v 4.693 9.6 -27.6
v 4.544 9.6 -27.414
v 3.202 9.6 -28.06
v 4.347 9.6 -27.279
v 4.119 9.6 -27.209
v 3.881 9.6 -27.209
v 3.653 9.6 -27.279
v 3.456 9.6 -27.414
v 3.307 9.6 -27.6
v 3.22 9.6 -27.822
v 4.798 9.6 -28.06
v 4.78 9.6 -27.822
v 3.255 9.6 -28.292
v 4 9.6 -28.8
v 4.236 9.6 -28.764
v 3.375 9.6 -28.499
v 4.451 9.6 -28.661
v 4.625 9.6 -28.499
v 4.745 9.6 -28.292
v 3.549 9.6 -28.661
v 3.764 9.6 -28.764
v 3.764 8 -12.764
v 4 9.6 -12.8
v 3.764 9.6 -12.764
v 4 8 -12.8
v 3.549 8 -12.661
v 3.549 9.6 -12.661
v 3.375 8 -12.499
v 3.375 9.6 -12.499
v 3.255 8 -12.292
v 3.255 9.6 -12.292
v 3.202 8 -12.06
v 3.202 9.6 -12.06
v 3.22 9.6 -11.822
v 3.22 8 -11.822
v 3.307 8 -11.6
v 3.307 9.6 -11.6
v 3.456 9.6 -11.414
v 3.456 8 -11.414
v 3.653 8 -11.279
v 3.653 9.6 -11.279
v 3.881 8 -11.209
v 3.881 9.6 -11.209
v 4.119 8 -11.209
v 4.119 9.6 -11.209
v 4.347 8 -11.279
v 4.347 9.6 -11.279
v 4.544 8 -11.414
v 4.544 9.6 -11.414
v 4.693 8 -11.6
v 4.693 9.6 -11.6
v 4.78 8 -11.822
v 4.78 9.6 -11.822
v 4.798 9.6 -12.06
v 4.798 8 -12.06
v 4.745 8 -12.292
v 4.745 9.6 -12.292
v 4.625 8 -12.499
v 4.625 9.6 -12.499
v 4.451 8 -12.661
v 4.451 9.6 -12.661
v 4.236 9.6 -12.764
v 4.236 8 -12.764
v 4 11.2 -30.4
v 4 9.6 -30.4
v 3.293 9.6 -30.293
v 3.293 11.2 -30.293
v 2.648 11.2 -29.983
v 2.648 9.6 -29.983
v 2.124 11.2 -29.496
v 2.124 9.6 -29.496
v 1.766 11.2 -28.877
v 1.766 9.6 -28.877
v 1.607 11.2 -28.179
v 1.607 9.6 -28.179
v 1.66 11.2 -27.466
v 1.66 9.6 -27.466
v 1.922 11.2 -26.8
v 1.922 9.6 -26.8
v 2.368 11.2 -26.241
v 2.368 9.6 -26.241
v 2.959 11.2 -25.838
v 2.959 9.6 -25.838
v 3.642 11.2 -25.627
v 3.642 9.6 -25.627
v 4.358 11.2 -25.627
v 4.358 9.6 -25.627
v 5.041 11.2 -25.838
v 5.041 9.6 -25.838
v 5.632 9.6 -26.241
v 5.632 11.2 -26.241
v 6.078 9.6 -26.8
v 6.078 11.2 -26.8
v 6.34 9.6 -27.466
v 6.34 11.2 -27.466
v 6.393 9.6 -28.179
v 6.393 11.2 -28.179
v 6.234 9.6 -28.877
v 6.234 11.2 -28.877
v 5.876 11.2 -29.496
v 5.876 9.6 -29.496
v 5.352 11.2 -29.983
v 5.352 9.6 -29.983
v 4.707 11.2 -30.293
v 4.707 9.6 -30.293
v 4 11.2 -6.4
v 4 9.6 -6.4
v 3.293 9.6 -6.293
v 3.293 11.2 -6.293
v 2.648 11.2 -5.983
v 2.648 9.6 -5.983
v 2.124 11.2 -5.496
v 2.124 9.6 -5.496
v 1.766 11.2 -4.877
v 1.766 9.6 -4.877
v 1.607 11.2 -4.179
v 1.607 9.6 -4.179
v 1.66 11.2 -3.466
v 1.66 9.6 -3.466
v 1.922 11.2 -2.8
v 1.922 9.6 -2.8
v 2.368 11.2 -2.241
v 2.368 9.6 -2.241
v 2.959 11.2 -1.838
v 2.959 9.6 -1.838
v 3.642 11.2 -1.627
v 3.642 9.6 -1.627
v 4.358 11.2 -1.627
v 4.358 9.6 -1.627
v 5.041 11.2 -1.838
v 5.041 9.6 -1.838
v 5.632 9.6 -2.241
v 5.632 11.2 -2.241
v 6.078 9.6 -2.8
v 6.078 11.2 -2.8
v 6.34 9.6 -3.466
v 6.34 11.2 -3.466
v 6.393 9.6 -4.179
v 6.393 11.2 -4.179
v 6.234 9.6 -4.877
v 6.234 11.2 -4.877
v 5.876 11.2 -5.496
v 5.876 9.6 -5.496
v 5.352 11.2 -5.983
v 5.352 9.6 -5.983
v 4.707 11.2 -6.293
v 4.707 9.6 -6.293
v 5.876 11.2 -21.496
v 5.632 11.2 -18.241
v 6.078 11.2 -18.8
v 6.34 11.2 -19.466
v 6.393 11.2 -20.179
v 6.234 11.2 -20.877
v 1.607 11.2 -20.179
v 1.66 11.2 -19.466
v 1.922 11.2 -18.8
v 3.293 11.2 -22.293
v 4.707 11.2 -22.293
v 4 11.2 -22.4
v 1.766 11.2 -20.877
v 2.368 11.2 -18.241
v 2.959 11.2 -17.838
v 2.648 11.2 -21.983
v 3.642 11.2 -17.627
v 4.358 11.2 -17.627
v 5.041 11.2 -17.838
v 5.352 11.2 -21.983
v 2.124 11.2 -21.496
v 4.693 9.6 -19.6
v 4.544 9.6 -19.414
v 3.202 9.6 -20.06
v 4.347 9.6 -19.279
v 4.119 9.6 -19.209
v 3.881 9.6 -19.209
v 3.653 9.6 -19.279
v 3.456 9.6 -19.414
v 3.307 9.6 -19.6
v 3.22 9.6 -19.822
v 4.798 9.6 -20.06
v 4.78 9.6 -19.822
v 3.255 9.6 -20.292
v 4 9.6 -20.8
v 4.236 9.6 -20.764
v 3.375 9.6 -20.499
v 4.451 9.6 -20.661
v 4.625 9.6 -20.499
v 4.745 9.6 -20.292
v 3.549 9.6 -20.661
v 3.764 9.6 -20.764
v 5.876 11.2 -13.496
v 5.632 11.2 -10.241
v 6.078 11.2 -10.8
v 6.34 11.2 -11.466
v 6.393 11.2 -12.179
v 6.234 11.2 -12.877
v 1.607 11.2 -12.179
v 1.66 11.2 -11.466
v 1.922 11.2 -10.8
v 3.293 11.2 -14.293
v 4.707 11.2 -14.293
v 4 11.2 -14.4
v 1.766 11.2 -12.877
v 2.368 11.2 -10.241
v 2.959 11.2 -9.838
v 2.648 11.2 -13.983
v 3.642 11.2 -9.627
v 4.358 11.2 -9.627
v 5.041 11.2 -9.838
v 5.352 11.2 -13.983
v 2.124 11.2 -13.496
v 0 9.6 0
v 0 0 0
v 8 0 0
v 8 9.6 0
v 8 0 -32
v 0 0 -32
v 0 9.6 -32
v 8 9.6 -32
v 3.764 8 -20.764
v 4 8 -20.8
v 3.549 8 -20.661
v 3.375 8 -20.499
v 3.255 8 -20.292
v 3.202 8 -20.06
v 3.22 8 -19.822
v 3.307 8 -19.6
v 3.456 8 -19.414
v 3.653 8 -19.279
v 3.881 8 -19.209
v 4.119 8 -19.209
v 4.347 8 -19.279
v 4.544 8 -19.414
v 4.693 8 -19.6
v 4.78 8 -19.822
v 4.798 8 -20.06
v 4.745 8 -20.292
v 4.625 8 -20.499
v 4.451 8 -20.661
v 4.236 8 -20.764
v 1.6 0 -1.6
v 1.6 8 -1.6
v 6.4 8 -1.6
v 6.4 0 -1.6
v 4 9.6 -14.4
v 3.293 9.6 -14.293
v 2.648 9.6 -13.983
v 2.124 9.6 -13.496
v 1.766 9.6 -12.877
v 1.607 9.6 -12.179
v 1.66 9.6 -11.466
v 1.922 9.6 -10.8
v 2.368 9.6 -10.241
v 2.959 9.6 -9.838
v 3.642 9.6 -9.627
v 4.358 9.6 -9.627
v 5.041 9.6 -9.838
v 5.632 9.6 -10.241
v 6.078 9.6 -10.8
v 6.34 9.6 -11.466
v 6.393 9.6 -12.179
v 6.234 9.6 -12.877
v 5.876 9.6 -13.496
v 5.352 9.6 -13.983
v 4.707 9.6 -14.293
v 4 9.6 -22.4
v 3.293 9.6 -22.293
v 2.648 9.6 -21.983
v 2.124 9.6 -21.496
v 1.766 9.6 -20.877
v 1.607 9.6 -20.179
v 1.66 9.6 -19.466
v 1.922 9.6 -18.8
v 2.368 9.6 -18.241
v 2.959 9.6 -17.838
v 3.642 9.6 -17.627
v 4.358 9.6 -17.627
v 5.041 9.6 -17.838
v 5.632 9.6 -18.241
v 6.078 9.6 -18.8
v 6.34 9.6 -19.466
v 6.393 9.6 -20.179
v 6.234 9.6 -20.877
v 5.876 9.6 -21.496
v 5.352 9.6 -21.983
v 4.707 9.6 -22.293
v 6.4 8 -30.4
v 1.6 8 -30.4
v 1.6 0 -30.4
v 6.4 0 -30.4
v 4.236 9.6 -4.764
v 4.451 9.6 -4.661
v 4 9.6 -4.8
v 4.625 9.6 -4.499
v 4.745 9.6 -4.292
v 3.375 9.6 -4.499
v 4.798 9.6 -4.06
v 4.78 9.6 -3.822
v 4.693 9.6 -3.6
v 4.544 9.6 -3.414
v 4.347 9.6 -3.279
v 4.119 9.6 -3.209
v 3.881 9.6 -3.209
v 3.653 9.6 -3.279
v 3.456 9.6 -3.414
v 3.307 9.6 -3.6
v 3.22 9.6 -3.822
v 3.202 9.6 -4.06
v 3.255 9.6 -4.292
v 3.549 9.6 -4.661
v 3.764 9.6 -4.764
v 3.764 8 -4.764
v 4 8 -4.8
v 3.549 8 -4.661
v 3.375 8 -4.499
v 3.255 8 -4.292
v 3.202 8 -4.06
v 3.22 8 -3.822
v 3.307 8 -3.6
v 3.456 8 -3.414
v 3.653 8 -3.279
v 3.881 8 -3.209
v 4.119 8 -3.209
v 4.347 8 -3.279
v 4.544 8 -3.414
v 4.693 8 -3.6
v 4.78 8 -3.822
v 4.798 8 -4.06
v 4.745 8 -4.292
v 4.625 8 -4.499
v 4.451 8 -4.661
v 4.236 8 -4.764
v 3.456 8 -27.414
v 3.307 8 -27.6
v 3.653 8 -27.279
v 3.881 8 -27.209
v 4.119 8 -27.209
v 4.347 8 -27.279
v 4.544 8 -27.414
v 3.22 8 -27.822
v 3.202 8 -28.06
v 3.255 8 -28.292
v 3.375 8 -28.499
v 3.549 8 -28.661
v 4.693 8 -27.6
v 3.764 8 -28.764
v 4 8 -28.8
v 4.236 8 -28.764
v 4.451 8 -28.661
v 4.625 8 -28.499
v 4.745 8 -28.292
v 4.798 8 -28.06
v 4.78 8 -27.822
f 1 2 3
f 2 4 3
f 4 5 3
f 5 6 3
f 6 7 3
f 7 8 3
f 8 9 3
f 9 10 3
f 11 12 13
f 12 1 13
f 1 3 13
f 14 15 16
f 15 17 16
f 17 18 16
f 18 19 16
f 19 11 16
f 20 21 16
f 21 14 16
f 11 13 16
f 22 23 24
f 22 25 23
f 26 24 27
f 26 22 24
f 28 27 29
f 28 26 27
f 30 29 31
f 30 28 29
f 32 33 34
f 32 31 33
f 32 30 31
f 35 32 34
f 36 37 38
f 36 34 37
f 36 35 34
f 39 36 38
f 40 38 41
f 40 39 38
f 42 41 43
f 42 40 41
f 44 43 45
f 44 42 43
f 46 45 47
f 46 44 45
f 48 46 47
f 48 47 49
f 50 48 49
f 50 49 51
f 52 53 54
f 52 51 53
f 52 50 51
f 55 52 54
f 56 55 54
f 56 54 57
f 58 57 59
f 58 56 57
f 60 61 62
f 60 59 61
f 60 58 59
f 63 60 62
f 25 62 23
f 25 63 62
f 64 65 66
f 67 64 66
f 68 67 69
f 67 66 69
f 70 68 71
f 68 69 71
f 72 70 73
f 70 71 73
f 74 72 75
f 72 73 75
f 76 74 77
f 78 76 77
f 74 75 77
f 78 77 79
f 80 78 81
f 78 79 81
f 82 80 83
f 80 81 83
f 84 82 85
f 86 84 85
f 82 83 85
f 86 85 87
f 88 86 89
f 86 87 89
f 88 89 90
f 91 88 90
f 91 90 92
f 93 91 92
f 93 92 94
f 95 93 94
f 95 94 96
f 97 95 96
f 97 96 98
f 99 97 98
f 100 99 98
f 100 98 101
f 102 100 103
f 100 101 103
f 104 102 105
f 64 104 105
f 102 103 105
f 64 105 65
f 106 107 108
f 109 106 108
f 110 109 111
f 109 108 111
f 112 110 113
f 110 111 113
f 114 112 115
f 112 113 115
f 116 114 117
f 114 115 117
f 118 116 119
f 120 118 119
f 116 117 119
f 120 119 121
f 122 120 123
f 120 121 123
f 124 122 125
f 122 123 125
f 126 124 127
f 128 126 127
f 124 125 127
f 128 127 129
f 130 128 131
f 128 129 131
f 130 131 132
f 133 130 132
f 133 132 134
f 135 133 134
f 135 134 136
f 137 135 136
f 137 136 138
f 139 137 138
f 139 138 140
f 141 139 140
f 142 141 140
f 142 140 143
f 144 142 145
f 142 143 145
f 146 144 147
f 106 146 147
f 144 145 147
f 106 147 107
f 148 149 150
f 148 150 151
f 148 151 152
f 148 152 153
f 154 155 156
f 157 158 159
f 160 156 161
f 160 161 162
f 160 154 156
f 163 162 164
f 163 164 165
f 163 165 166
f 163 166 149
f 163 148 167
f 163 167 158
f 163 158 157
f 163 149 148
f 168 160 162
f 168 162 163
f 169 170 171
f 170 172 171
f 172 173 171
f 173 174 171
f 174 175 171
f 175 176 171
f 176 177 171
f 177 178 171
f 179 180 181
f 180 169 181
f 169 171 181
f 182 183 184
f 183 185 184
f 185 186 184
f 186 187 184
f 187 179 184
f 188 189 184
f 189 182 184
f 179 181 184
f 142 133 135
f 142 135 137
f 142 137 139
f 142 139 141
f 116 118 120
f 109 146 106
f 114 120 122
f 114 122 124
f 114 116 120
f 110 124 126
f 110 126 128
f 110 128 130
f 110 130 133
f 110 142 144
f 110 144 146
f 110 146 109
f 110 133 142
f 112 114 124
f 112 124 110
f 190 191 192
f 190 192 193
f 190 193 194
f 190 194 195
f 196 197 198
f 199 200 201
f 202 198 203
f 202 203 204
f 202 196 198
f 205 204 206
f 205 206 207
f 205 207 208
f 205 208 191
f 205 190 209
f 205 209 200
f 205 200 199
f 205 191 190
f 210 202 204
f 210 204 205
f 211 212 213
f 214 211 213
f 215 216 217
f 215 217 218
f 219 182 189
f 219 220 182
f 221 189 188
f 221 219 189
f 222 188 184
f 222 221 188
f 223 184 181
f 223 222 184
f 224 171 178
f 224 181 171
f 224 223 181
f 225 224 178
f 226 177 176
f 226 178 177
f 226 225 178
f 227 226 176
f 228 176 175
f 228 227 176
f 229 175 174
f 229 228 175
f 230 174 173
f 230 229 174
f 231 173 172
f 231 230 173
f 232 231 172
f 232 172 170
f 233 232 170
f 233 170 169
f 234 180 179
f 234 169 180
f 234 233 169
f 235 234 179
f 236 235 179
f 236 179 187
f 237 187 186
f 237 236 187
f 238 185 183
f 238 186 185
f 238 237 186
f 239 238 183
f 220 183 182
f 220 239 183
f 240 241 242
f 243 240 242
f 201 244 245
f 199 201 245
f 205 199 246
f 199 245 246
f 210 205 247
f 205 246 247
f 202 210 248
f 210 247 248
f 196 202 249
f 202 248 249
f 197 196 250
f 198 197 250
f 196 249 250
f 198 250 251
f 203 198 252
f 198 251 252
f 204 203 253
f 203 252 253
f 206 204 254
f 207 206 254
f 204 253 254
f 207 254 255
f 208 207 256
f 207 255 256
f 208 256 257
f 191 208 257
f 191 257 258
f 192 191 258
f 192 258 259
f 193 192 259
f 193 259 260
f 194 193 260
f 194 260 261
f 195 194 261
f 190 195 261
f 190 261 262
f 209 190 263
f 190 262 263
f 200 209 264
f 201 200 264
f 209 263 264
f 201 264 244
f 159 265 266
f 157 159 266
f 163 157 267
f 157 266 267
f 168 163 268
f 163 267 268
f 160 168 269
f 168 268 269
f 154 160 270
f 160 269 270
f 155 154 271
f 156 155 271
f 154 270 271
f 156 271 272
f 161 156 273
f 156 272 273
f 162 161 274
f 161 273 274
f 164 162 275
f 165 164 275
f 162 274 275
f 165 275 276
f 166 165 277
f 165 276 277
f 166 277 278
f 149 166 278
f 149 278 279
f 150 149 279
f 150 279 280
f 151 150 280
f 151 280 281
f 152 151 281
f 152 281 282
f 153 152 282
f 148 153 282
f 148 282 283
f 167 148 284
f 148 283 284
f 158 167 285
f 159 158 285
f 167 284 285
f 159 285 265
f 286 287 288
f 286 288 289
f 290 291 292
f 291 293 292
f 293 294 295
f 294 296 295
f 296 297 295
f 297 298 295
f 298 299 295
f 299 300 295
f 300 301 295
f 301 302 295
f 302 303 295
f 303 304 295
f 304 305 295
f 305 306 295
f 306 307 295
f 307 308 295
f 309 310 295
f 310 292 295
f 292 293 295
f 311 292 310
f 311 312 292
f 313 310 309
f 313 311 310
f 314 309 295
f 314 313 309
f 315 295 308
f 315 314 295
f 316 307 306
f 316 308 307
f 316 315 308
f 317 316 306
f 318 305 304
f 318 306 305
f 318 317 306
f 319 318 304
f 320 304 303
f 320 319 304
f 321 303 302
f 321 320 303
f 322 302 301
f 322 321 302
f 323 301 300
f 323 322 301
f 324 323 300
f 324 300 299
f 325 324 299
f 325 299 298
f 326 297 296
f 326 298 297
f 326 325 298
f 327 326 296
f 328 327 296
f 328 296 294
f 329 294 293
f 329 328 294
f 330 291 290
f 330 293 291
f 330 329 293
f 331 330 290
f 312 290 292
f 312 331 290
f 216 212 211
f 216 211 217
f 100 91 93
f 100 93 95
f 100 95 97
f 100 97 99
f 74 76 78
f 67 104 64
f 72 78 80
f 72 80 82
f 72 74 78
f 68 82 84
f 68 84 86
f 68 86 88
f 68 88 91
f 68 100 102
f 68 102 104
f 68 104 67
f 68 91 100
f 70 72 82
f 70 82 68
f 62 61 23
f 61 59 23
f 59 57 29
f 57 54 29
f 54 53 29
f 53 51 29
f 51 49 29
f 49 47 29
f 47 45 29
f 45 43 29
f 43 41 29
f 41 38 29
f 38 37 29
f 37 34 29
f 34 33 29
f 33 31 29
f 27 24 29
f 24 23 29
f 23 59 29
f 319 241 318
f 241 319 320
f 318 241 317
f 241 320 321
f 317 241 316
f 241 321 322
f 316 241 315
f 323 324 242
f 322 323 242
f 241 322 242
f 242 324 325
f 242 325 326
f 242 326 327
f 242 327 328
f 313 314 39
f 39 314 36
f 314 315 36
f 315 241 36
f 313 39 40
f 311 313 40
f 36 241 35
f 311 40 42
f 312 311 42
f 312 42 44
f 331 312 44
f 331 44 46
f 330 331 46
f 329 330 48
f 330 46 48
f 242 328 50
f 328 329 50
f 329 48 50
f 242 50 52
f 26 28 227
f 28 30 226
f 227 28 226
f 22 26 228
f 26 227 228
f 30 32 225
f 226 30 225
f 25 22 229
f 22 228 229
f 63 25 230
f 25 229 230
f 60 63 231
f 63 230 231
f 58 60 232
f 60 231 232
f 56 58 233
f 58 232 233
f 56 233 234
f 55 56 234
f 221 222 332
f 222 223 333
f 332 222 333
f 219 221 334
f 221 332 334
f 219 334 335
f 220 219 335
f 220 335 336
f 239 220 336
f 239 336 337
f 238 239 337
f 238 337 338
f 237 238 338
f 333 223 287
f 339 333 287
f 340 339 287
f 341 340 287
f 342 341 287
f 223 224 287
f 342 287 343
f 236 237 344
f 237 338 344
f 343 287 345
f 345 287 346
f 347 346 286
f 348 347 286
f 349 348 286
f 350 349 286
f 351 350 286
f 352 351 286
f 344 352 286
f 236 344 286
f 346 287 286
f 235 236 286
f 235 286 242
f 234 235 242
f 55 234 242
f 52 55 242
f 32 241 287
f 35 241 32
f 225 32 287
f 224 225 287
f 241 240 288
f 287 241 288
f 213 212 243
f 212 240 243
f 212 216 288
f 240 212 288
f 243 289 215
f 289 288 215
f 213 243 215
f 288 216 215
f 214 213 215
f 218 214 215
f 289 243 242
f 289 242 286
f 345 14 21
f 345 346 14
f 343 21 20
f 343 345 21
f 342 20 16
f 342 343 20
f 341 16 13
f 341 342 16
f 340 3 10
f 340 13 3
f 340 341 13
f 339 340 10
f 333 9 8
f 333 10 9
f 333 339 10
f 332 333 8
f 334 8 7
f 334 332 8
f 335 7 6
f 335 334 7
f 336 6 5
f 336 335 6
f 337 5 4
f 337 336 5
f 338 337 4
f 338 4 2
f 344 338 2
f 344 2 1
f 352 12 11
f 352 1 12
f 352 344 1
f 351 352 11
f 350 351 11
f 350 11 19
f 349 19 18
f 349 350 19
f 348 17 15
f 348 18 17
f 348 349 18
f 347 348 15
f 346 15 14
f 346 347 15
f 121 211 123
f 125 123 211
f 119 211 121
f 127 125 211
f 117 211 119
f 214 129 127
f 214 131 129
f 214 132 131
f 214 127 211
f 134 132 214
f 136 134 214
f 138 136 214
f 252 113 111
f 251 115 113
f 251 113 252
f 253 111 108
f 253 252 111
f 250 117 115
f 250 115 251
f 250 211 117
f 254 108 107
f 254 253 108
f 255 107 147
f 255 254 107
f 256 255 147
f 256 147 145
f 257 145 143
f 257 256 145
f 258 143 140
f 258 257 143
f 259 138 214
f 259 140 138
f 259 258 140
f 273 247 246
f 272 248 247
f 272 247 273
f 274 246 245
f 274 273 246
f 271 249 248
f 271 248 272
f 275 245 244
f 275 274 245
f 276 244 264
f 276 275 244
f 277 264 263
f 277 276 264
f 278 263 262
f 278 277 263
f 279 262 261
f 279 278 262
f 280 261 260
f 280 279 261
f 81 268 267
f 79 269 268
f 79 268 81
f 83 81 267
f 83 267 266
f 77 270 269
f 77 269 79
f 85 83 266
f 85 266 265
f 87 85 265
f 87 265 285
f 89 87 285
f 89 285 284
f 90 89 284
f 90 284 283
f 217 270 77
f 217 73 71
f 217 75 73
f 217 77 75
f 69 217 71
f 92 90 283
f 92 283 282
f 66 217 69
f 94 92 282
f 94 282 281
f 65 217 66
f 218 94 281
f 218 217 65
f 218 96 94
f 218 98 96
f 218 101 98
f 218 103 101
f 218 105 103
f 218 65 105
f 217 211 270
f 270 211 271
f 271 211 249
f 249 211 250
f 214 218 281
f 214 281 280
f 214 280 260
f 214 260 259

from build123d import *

# Parameters (mm, degrees)
SKETCH1_W            = 8
SKETCH1_H            = 32
BOSS_EXTRUDE1_DEPTH  = 9.6
SKETCH2_R            = 2.4
BOSS_EXTRUDE2_DEPTH  = 1.6
LPATTERN1_COUNT      = 2
LPATTERN1_PITCH      = 8
LPATTERN1_COUNT_DIR2 = 4
LPATTERN1_PITCH_DIR2 = 8
SHELL1_T             = -1.6


with BuildPart() as part:
    # Sketch1 → Boss-Extrude1 (new body)
    with BuildSketch(Plane(origin=(0, 0, 0), x_dir=(1, 0, 0), z_dir=(0, 1, 0))):
        with Locations((4, 16)):
            Rectangle(SKETCH1_W, SKETCH1_H)
    extrude(amount=BOSS_EXTRUDE1_DEPTH)

    # Sketch2 → Boss-Extrude2 (add)
    with BuildSketch(Plane(origin=(0, 9.6, 0), x_dir=(1, 0, 0), z_dir=(0, 1, 0))):
        with Locations(Location((4, 4, 0), (0, 0, 90))):
            Circle(SKETCH2_R)
    boss_extrude2 = extrude(amount=BOSS_EXTRUDE2_DEPTH)

    # LPattern1: Boss-Extrude2 2 × 4, 4 skipped
    with Locations(*[(i * LPATTERN1_PITCH, 0, -j * LPATTERN1_PITCH_DIR2) for i in range(LPATTERN1_COUNT) for j in range(LPATTERN1_COUNT_DIR2) if (i, j) not in ((0, 0), (1, 0), (1, 1), (1, 2), (1, 3))]):
        add(boss_extrude2)

    # Shell1
    shell1_openings = [part.faces().sort_by_distance(p)[0] for p in [
        (4, 0, -16),
    ]]
    offset(amount=SHELL1_T, openings=shell1_openings, kind=Kind.INTERSECTION)


solid = part.part
